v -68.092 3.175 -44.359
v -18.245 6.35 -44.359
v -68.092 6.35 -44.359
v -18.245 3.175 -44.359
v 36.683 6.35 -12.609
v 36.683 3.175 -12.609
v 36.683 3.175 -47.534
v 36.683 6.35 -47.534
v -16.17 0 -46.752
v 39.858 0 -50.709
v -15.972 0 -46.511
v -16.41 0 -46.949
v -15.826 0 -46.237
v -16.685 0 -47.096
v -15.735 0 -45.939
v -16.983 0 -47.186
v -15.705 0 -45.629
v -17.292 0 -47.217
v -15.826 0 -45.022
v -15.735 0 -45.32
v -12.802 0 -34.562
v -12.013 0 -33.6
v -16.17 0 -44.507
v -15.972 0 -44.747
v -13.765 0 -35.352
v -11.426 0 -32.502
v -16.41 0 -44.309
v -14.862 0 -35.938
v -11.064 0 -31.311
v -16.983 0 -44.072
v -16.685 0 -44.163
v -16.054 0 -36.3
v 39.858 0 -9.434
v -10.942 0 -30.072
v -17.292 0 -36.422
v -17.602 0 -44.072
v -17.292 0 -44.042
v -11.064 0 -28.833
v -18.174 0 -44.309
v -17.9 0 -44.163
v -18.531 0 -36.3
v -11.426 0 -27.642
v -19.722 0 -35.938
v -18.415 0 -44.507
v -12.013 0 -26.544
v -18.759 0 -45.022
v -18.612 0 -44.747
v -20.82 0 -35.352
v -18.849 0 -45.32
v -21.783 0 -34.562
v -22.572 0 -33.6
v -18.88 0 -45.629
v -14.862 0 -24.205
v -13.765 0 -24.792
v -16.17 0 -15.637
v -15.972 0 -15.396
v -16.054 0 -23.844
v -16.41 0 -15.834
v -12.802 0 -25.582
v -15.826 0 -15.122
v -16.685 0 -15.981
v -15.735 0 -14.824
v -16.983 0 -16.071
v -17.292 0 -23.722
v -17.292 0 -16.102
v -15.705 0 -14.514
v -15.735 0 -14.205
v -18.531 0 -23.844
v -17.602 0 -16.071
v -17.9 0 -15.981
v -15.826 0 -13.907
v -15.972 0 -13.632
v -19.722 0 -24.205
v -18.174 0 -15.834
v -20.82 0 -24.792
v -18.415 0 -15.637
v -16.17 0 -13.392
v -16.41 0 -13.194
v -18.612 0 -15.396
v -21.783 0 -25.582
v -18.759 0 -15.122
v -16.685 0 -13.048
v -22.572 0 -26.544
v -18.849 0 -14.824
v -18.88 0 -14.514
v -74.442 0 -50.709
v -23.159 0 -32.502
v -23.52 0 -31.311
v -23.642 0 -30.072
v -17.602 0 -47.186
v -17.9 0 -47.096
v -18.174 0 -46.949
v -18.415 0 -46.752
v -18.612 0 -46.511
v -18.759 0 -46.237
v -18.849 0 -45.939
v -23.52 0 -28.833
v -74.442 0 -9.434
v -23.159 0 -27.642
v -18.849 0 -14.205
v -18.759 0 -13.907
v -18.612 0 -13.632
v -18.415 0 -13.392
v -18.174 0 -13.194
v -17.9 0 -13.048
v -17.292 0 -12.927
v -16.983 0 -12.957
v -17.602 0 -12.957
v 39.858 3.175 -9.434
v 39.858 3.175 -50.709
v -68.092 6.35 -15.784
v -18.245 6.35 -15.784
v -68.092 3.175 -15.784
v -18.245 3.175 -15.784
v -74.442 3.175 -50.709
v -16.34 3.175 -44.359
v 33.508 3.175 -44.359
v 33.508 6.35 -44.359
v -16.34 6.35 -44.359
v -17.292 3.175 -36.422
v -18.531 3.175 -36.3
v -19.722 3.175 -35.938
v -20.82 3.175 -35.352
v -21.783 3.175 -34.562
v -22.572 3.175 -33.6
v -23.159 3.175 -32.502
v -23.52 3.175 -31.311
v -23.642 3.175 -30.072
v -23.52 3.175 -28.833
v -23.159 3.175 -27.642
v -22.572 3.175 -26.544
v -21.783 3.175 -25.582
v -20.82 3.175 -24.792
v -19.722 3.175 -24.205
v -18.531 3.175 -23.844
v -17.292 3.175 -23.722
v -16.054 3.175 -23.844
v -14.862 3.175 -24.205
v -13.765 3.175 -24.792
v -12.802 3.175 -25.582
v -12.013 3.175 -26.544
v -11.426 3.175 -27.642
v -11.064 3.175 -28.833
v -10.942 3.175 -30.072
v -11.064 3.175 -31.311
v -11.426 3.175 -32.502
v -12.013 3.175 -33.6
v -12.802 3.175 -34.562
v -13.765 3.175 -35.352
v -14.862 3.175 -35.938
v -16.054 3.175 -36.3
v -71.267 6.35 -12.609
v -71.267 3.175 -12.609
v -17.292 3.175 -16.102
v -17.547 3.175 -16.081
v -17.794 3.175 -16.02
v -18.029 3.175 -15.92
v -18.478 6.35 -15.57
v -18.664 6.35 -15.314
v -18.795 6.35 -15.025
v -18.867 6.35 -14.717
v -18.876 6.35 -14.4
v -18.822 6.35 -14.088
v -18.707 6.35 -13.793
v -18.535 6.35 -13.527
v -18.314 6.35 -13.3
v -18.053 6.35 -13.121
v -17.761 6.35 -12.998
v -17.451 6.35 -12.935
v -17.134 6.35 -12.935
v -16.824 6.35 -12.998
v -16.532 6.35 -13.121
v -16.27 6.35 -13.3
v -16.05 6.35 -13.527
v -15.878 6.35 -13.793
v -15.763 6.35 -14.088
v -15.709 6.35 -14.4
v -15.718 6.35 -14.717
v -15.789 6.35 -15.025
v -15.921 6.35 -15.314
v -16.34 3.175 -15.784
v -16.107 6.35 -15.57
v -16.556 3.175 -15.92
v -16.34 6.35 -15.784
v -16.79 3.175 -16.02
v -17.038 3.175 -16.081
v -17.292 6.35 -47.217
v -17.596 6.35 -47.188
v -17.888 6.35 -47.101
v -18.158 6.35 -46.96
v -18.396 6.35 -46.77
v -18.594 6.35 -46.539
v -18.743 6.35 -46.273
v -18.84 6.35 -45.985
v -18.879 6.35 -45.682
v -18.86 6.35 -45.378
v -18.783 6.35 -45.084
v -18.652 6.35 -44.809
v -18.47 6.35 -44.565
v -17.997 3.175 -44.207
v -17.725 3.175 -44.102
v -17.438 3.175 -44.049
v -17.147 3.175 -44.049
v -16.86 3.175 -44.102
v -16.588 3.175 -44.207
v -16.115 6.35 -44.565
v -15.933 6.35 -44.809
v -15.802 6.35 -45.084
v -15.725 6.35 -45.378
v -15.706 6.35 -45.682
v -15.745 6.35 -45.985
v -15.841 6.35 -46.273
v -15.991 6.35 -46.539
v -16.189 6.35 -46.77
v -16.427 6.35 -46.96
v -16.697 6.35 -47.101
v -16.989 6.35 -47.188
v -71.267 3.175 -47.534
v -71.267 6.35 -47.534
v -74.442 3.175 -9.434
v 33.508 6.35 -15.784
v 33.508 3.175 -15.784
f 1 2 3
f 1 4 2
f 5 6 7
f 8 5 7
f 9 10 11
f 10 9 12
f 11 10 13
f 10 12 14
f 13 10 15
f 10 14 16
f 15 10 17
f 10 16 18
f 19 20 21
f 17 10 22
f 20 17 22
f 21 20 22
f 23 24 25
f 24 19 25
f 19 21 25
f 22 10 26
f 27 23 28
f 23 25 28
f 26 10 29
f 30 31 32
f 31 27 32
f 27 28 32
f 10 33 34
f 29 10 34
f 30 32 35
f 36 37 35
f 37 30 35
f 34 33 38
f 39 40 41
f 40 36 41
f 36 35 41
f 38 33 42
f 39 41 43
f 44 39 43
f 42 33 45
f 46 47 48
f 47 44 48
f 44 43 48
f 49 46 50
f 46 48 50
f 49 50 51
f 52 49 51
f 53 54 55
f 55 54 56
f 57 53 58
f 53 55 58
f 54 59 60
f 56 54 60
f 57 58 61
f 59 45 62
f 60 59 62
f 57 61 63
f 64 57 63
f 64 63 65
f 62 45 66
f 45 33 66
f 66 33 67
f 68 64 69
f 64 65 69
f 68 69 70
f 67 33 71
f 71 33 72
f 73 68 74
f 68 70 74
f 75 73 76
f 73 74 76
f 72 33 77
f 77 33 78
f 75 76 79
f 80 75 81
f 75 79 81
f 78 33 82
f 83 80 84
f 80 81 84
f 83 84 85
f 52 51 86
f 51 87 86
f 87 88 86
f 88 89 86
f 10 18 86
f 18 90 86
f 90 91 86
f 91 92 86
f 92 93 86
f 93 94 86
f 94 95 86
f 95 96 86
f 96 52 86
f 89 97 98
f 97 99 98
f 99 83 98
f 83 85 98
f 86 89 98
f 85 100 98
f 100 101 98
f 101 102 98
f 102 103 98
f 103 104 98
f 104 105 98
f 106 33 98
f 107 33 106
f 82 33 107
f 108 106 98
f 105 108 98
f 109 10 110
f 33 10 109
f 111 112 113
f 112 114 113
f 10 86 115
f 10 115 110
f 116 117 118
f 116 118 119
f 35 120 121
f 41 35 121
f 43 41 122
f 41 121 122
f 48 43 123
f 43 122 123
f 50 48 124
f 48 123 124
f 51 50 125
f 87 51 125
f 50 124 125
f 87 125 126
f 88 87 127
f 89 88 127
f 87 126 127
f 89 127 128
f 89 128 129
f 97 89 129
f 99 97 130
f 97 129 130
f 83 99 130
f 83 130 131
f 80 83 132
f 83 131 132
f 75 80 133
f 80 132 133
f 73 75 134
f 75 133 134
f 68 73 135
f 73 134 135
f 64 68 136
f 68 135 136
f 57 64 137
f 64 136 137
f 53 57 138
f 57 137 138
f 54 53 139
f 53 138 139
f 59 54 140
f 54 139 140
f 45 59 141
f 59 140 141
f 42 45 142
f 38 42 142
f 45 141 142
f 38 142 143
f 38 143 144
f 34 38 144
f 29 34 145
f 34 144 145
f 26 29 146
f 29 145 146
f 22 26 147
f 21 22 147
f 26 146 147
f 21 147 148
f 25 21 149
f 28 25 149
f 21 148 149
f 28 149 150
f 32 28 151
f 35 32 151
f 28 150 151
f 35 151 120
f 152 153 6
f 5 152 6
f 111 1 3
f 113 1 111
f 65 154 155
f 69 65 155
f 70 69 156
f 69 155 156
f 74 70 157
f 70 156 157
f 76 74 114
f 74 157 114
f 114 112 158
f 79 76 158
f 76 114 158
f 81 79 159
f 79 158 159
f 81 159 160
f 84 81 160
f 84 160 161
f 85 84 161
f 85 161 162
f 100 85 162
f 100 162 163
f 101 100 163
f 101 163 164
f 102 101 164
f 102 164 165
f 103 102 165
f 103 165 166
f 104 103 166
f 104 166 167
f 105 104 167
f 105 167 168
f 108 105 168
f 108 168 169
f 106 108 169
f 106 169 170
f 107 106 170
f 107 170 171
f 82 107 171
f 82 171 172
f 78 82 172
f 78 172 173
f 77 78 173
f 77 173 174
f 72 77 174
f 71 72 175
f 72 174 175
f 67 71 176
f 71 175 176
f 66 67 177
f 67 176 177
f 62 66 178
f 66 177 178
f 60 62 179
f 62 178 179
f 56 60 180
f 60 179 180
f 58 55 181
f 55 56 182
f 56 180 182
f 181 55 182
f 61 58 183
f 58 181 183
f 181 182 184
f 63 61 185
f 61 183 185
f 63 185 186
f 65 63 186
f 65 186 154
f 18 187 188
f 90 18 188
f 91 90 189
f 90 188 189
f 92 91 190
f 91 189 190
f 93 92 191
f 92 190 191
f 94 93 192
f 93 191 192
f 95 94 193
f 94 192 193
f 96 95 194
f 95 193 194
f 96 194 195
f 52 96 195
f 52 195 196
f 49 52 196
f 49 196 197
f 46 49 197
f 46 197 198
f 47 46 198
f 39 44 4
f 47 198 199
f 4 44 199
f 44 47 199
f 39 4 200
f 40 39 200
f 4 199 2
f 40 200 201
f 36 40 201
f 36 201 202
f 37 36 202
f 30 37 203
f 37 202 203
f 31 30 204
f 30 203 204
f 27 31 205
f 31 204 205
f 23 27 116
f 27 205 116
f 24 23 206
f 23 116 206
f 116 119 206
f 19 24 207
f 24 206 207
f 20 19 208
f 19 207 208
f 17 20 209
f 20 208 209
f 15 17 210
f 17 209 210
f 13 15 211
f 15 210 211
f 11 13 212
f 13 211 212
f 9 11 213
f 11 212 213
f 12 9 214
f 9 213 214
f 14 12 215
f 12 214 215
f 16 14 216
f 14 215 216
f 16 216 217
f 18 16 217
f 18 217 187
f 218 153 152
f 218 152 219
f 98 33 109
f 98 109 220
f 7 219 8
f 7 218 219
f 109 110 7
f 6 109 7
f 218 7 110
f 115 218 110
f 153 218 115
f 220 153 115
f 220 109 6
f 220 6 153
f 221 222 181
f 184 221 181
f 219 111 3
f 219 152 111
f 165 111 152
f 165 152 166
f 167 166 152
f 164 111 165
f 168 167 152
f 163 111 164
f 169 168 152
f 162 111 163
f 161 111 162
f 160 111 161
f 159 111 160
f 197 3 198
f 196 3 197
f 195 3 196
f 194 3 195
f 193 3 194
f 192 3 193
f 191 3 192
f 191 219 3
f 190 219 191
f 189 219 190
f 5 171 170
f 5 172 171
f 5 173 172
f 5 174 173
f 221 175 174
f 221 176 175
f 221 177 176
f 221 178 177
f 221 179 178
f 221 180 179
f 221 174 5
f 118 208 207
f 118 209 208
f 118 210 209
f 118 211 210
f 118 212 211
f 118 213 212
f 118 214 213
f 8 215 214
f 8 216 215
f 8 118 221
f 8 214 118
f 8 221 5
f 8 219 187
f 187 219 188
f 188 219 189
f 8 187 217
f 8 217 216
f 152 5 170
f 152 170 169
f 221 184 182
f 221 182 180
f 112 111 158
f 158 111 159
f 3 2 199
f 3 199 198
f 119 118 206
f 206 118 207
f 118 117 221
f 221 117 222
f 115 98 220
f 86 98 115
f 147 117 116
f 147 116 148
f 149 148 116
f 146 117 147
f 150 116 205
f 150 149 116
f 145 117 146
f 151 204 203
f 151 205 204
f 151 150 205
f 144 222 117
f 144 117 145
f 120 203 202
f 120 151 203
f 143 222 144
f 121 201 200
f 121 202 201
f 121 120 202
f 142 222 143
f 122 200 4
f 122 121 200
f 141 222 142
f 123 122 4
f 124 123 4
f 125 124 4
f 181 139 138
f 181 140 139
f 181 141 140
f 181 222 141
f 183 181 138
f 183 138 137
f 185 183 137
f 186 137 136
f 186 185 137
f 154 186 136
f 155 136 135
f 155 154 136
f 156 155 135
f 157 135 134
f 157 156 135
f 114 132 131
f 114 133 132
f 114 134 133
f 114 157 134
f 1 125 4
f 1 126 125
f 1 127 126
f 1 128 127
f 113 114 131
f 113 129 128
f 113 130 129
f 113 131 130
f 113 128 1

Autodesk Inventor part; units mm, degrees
ref_plane "YZ Plane" through (0, 0, 0) normal (1, 0, 0) x (0, 1, 0)
ref_plane "XZ Plane" through (0, 0, 0) normal (0, 1, 0) x (-1, 0, 0)
ref_plane "XY Plane" through (0, 0, 0) normal (0, 0, 1) x (1, 0, 0)
sketch "Sketch1" plane through (0, 0, 0) normal (0, 1, 0) x (-1, 0, 0)
  line L0 (74.4424, -50.7093) -> (-39.8576, -50.7093)
  line L1 (-39.8576, -50.7093) -> (-39.8576, -9.4343)
  line L2 (-39.8576, -9.4343) -> (74.4424, -9.4343)
  line L3 (74.4424, -9.4343) -> (74.4424, -50.7093)
  point P0 (0, 0)
  dimension "d0" = 41.275
  dimension "d1" = 114.3
extrude "Extrusion1" add sketch "Sketch1" along normal blind 3.175
sketch "Sketch2" plane through (0, 3.175, 0) normal (0, 1, 0) x (1, 0, 0)
  line L0 (-74.4424, 50.7093) -> (-74.4424, 9.4343) projected
  line L1 (-74.4424, 50.7093) -> (-71.2674, 50.7093)
  line L2 (39.8576, 50.7093) -> (-74.4424, 50.7093) projected
  line L3 (-71.2674, 50.7093) -> (-71.2674, 47.5343)
  line L4 (-71.2674, 47.5343) -> (-68.0924, 47.5343)
  line L5 (-68.0924, 47.5343) -> (-68.0924, 12.6093)
  line L6 (-68.0924, 12.6093) -> (-71.2674, 12.6093)
  line L7 (-71.2674, 12.6093) -> (-71.2674, 47.5343)
  point P0 (0, 0)
  dimension "d4" = 3.175
  dimension "d5" = 3.175
  dimension "d6" = 3.175
  dimension "d7" = 34.925
extrude "Extrusion2" add sketch "Sketch2" along normal blind 3.175
sketch "Sketch3" plane through (0, 3.175, 0) normal (0, 1, 0) x (1, 0, 0)
  line L0 (39.8576, 9.4343) -> (39.8576, 50.7093) projected
  line L1 (39.8576, 50.7093) -> (36.6826, 50.7093)
  line L2 (39.8576, 50.7093) -> (-74.4424, 50.7093) projected
  line L3 (36.6826, 50.7093) -> (36.6826, 47.5343)
  line L4 (36.6826, 47.5343) -> (33.5076, 47.5343)
  line L5 (33.5076, 47.5343) -> (33.5076, 12.6093)
  line L6 (33.5076, 12.6093) -> (36.6826, 12.6093)
  line L7 (36.6826, 12.6093) -> (36.6826, 47.5343)
  point P0 (0, 0)
  dimension "d10" = 3.175
  dimension "d11" = 3.175
  dimension "d12" = 3.175
  dimension "d13" = 34.925
extrude "Extrusion3" add sketch "Sketch3" along normal blind 3.175
sketch "Sketch4" plane through (0, 3.175, 0) normal (0, 1, 0) x (1, 0, 0)
  line L0 (-68.0924, 47.5343) -> (-68.0924, 12.6093) projected
  line L1 (-68.0924, 47.5343) -> (33.5076, 47.5343)
  line L2 (33.5076, 47.5343) -> (33.5076, 44.3593)
  line L3 (33.5076, 44.3593) -> (-68.0924, 44.3593)
  line L4 (-68.0924, 44.3593) -> (-68.0924, 47.5343)
  point P0 (0, 0)
  dimension "d16" = 3.175
  dimension "d17" = 101.6
extrude "Extrusion4" add sketch "Sketch4" along normal blind 3.175
sketch "Sketch5" plane through (0, 3.175, 0) normal (0, 1, 0) x (1, 0, 0)
  line L0 (-71.2674, 12.6093) -> (-68.0924, 12.6093) projected
  line L1 (-68.0924, 12.6093) -> (33.5076, 12.6093)
  line L2 (33.5076, 12.6093) -> (33.5076, 15.7843)
  line L3 (33.5076, 15.7843) -> (-68.0924, 15.7843)
  line L4 (-68.0924, 15.7843) -> (-68.0924, 12.6093)
  point P0 (0, 0)
  dimension "d20" = 3.175
  dimension "d21" = 101.6
extrude "Extrusion5" add sketch "Sketch5" along normal blind 3.175
sketch "Sketch10" plane through (0, 0, 0) normal (0, -1, 0) x (1, 0, 0)
  line L0 (39.8576, -9.4343) -> (39.8576, -30.0718)
  line L1 (39.8576, -9.4343) -> (39.8576, -50.7093) projected
  line L2 (39.8576, -30.0718) -> (-17.2924, -30.0718)
  point P0 (0, 0)
  dimension "d38" = 20.6375
  dimension "d39" = 57.15
hole "Hole2" at (-17.2924, 0, -30.0718) direction (0, 1, 0) diameter 12.7 end through all
sketch "Sketch13" plane through (0, 0, 0) normal (0, -1, 0) x (1, 0, 0)
  line L0 (39.8576, -9.4343) -> (39.8576, -50.7093) projected
  line L1 (39.8576, -9.4343) -> (39.8576, -14.5143)
  line L2 (39.8576, -14.5143) -> (-17.2924, -14.5143)
  point P0 (0, 0)
  dimension "d51" = 5.08
  dimension "d52" = 57.15
hole "Hole3" at (-17.2924, 0, -14.5143) direction (0, 1, 0) diameter 3.175 end through all
sketch "Sketch14" plane through (0, 0, 0) normal (0, -1, 0) x (1, 0, 0)
  line L0 (39.8576, -9.4343) -> (39.8576, -50.7093) projected
  line L1 (39.8576, -50.7093) -> (39.8576, -45.6293)
  line L2 (39.8576, -45.6293) -> (-17.2924, -45.6293)
  point P0 (0, 0)
  dimension "d60" = 5.08
  dimension "d61" = 57.15
hole "Hole4" at (-17.2924, 0, -45.6293) direction (0, 1, 0) diameter 3.175 end through all
properties part number "five_cell_top_case"
